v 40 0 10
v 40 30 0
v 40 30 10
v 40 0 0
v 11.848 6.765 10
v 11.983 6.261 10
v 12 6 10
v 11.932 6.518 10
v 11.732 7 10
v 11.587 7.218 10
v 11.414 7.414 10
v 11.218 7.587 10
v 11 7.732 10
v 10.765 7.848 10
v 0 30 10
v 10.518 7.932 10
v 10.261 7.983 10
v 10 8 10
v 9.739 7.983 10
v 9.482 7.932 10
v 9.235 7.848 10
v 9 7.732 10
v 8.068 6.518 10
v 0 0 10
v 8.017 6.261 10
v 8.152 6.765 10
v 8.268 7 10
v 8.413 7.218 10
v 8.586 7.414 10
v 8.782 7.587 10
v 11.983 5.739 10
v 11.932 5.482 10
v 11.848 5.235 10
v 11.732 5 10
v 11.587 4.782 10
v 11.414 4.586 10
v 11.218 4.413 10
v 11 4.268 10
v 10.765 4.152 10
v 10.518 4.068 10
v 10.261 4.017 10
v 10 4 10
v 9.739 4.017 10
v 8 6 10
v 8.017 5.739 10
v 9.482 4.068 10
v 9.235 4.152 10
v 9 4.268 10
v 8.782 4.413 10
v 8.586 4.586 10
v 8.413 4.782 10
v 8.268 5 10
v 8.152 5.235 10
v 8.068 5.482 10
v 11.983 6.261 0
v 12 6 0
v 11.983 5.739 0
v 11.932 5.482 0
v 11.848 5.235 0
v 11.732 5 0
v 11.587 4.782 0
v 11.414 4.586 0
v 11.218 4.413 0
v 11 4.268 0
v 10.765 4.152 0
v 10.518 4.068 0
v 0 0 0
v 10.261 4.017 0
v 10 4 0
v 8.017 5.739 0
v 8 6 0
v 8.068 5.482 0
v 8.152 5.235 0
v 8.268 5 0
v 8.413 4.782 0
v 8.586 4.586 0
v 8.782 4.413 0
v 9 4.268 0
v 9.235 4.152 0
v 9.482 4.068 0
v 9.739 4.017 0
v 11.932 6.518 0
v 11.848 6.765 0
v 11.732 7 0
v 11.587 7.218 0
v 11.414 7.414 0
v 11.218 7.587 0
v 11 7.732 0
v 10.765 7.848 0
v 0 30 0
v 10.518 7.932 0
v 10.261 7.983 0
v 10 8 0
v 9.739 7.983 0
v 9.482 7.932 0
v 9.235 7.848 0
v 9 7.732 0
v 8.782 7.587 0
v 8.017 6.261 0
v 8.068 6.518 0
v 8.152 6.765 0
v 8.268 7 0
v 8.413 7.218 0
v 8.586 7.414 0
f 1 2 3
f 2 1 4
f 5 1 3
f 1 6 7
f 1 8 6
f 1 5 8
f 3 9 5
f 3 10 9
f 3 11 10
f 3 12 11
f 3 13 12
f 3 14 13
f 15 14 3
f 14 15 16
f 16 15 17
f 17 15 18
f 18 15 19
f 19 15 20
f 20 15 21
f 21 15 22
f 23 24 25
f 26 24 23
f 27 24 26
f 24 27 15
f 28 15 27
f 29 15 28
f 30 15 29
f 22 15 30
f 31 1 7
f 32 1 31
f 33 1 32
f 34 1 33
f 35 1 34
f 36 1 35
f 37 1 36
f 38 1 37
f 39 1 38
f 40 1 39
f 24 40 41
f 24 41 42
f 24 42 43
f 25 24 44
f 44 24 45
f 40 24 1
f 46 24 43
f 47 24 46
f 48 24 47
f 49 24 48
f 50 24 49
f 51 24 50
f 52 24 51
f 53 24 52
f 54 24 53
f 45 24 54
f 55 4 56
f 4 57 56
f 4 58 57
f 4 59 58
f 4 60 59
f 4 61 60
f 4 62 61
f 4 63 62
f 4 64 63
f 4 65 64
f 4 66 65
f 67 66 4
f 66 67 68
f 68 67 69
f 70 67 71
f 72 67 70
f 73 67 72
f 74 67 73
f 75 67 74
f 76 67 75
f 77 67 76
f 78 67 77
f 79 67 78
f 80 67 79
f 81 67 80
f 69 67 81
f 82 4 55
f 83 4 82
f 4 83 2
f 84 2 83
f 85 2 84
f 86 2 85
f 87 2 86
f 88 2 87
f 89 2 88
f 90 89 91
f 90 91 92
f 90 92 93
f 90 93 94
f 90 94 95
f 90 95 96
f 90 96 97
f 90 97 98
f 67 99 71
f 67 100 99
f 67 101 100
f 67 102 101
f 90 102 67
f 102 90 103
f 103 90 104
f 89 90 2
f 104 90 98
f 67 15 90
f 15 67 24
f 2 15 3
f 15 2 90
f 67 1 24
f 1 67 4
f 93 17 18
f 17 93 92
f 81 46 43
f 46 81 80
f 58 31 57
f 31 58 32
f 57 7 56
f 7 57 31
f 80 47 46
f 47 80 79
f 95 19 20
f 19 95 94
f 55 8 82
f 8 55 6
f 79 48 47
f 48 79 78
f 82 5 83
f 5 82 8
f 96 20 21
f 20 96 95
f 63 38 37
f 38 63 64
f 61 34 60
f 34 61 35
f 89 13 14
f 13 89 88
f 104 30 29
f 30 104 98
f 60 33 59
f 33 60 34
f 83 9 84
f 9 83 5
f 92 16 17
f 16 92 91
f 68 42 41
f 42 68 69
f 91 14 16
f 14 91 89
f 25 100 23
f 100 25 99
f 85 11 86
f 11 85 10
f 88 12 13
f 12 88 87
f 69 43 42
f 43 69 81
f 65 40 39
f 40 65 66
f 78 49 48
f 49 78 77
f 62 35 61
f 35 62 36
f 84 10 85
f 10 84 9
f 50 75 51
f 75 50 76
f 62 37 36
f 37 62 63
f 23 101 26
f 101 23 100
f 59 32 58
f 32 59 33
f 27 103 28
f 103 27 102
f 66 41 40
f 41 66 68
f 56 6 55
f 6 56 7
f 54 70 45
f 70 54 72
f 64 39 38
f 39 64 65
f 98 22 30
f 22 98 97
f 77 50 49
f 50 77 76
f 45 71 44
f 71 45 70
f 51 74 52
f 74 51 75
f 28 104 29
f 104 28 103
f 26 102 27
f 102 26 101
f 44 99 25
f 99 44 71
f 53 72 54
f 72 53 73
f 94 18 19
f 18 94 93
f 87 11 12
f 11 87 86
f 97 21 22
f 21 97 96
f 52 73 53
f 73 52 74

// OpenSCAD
// units=mm — generated by scad_emitter.py
// part=unnamed
$fn = 48;

difference() { cube([40, 30, 10]); translate([10, 6, 10.5]) rotate([180, 0, 0]) cylinder(h=11, r=2, $fn=$fn); }
